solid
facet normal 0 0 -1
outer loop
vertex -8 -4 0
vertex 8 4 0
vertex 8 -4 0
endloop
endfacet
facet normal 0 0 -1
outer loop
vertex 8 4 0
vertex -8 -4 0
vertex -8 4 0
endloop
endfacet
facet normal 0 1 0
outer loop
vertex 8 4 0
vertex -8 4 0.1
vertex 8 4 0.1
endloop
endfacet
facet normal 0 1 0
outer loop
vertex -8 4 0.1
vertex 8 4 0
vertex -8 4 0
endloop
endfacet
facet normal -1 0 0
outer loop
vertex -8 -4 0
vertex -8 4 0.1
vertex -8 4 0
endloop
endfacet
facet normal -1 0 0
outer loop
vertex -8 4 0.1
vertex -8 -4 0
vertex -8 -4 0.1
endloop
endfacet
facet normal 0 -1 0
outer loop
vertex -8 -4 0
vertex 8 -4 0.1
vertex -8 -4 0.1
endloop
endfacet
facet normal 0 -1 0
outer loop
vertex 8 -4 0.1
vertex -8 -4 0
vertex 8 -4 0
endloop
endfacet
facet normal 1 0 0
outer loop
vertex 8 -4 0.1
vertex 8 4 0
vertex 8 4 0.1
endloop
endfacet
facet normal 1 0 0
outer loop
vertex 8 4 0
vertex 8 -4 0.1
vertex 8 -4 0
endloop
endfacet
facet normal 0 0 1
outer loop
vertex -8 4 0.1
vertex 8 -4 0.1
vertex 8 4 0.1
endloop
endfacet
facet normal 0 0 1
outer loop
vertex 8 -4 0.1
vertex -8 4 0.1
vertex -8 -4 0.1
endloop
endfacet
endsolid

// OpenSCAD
// file: ../p/box5-12.scad
use <../lib.scad>
function ldraw_lib__box5_12() = [
// 0 Box with 5 Faces without Any Edges
// 0 Name: box5-12.dat
// 0 Author: Chris Dee [cwdee]
// 0 !LDRAW_ORG Primitive UPDATE 2009-02
// 0 !LICENSE Licensed under CC BY 4.0 : see CAreadme.txt
// 
// 0 BFC CERTIFY CCW
  [0,"BFC","CERTIFY"],
  [0,"BFC","CCW"],
// 
// 0 !HISTORY 2009-09-03 [PTadmin] Official Update 2009-02
// 
// 
// 4 16 1 1 1 1 1 -1 -1 1 -1 -1 1 1
  [4,16,1,1,1,1,1,-1,-1,1,-1,-1,1,1],
// 4 16 -1 0 1 1 0 1 1 1 1 -1 1 1
  [4,16,-1,0,1,1,0,1,1,1,1,-1,1,1],
// 4 16 -1 0 -1 -1 0 1 -1 1 1 -1 1 -1
  [4,16,-1,0,-1,-1,0,1,-1,1,1,-1,1,-1],
// 4 16 1 0 -1 -1 0 -1 -1 1 -1 1 1 -1
  [4,16,1,0,-1,-1,0,-1,-1,1,-1,1,1,-1],
// 4 16 1 0 1 1 0 -1 1 1 -1 1 1 1
  [4,16,1,0,1,1,0,-1,1,1,-1,1,1,1],
// 0
];
module ldraw_lib__box5_12(step=0, col=false, unit=2/5, alt=false, line=0.2, solid=!$preview)
    makepoly(ldraw_lib__box5_12(), step=step, col=col, unit=unit, alt=alt, line=line, solid=solid);
ldraw_lib__box5_12(line=0.2);
// main file
use <../lib.scad>
use <../p/box5-12.scad>
function ldraw_lib__192685d() = [
// 0 Sticker  1.0 x  2.0 Black
// 0 Name: 192685d.dat
// 0 Author: Rene Rechthaler [Blechtaler]
// 0 !LDRAW_ORG Part UPDATE 2023-06
// 0 !LICENSE Licensed under CC BY 4.0 : see CAreadme.txt
// 
// 0 BFC CERTIFY CCW
  [0,"BFC","CERTIFY"],
  [0,"BFC","CCW"],
// 
// 0 !KEYWORDS Set 1581-1
// 
// 0 !HISTORY 2023-11-19 [OrionP] Official Update 2023-06
// 
// 
// 1 16 0 -.25 0 20 0 0 0 .25 0 0 0 10 box5-12.dat
  [1,16,0,-.25,0,20,0,0,0,.25,0,0,0,10, ldraw_lib__box5_12()],
// 
// 4 0 -20 -.25 10 -20 -.25 -10 20 -.25 -10 20 -.25 10
  [4,0,-20,-.25,10,-20,-.25,-10,20,-.25,-10,20,-.25,10],
];
module ldraw_lib__192685d(step=0, col=false, unit=2/5, alt=false, line=0.2, solid=!$preview)
    makepoly(ldraw_lib__192685d(), step=step, col=col, unit=unit, alt=alt, line=line, solid=solid);
ldraw_lib__192685d(line=0.2);
